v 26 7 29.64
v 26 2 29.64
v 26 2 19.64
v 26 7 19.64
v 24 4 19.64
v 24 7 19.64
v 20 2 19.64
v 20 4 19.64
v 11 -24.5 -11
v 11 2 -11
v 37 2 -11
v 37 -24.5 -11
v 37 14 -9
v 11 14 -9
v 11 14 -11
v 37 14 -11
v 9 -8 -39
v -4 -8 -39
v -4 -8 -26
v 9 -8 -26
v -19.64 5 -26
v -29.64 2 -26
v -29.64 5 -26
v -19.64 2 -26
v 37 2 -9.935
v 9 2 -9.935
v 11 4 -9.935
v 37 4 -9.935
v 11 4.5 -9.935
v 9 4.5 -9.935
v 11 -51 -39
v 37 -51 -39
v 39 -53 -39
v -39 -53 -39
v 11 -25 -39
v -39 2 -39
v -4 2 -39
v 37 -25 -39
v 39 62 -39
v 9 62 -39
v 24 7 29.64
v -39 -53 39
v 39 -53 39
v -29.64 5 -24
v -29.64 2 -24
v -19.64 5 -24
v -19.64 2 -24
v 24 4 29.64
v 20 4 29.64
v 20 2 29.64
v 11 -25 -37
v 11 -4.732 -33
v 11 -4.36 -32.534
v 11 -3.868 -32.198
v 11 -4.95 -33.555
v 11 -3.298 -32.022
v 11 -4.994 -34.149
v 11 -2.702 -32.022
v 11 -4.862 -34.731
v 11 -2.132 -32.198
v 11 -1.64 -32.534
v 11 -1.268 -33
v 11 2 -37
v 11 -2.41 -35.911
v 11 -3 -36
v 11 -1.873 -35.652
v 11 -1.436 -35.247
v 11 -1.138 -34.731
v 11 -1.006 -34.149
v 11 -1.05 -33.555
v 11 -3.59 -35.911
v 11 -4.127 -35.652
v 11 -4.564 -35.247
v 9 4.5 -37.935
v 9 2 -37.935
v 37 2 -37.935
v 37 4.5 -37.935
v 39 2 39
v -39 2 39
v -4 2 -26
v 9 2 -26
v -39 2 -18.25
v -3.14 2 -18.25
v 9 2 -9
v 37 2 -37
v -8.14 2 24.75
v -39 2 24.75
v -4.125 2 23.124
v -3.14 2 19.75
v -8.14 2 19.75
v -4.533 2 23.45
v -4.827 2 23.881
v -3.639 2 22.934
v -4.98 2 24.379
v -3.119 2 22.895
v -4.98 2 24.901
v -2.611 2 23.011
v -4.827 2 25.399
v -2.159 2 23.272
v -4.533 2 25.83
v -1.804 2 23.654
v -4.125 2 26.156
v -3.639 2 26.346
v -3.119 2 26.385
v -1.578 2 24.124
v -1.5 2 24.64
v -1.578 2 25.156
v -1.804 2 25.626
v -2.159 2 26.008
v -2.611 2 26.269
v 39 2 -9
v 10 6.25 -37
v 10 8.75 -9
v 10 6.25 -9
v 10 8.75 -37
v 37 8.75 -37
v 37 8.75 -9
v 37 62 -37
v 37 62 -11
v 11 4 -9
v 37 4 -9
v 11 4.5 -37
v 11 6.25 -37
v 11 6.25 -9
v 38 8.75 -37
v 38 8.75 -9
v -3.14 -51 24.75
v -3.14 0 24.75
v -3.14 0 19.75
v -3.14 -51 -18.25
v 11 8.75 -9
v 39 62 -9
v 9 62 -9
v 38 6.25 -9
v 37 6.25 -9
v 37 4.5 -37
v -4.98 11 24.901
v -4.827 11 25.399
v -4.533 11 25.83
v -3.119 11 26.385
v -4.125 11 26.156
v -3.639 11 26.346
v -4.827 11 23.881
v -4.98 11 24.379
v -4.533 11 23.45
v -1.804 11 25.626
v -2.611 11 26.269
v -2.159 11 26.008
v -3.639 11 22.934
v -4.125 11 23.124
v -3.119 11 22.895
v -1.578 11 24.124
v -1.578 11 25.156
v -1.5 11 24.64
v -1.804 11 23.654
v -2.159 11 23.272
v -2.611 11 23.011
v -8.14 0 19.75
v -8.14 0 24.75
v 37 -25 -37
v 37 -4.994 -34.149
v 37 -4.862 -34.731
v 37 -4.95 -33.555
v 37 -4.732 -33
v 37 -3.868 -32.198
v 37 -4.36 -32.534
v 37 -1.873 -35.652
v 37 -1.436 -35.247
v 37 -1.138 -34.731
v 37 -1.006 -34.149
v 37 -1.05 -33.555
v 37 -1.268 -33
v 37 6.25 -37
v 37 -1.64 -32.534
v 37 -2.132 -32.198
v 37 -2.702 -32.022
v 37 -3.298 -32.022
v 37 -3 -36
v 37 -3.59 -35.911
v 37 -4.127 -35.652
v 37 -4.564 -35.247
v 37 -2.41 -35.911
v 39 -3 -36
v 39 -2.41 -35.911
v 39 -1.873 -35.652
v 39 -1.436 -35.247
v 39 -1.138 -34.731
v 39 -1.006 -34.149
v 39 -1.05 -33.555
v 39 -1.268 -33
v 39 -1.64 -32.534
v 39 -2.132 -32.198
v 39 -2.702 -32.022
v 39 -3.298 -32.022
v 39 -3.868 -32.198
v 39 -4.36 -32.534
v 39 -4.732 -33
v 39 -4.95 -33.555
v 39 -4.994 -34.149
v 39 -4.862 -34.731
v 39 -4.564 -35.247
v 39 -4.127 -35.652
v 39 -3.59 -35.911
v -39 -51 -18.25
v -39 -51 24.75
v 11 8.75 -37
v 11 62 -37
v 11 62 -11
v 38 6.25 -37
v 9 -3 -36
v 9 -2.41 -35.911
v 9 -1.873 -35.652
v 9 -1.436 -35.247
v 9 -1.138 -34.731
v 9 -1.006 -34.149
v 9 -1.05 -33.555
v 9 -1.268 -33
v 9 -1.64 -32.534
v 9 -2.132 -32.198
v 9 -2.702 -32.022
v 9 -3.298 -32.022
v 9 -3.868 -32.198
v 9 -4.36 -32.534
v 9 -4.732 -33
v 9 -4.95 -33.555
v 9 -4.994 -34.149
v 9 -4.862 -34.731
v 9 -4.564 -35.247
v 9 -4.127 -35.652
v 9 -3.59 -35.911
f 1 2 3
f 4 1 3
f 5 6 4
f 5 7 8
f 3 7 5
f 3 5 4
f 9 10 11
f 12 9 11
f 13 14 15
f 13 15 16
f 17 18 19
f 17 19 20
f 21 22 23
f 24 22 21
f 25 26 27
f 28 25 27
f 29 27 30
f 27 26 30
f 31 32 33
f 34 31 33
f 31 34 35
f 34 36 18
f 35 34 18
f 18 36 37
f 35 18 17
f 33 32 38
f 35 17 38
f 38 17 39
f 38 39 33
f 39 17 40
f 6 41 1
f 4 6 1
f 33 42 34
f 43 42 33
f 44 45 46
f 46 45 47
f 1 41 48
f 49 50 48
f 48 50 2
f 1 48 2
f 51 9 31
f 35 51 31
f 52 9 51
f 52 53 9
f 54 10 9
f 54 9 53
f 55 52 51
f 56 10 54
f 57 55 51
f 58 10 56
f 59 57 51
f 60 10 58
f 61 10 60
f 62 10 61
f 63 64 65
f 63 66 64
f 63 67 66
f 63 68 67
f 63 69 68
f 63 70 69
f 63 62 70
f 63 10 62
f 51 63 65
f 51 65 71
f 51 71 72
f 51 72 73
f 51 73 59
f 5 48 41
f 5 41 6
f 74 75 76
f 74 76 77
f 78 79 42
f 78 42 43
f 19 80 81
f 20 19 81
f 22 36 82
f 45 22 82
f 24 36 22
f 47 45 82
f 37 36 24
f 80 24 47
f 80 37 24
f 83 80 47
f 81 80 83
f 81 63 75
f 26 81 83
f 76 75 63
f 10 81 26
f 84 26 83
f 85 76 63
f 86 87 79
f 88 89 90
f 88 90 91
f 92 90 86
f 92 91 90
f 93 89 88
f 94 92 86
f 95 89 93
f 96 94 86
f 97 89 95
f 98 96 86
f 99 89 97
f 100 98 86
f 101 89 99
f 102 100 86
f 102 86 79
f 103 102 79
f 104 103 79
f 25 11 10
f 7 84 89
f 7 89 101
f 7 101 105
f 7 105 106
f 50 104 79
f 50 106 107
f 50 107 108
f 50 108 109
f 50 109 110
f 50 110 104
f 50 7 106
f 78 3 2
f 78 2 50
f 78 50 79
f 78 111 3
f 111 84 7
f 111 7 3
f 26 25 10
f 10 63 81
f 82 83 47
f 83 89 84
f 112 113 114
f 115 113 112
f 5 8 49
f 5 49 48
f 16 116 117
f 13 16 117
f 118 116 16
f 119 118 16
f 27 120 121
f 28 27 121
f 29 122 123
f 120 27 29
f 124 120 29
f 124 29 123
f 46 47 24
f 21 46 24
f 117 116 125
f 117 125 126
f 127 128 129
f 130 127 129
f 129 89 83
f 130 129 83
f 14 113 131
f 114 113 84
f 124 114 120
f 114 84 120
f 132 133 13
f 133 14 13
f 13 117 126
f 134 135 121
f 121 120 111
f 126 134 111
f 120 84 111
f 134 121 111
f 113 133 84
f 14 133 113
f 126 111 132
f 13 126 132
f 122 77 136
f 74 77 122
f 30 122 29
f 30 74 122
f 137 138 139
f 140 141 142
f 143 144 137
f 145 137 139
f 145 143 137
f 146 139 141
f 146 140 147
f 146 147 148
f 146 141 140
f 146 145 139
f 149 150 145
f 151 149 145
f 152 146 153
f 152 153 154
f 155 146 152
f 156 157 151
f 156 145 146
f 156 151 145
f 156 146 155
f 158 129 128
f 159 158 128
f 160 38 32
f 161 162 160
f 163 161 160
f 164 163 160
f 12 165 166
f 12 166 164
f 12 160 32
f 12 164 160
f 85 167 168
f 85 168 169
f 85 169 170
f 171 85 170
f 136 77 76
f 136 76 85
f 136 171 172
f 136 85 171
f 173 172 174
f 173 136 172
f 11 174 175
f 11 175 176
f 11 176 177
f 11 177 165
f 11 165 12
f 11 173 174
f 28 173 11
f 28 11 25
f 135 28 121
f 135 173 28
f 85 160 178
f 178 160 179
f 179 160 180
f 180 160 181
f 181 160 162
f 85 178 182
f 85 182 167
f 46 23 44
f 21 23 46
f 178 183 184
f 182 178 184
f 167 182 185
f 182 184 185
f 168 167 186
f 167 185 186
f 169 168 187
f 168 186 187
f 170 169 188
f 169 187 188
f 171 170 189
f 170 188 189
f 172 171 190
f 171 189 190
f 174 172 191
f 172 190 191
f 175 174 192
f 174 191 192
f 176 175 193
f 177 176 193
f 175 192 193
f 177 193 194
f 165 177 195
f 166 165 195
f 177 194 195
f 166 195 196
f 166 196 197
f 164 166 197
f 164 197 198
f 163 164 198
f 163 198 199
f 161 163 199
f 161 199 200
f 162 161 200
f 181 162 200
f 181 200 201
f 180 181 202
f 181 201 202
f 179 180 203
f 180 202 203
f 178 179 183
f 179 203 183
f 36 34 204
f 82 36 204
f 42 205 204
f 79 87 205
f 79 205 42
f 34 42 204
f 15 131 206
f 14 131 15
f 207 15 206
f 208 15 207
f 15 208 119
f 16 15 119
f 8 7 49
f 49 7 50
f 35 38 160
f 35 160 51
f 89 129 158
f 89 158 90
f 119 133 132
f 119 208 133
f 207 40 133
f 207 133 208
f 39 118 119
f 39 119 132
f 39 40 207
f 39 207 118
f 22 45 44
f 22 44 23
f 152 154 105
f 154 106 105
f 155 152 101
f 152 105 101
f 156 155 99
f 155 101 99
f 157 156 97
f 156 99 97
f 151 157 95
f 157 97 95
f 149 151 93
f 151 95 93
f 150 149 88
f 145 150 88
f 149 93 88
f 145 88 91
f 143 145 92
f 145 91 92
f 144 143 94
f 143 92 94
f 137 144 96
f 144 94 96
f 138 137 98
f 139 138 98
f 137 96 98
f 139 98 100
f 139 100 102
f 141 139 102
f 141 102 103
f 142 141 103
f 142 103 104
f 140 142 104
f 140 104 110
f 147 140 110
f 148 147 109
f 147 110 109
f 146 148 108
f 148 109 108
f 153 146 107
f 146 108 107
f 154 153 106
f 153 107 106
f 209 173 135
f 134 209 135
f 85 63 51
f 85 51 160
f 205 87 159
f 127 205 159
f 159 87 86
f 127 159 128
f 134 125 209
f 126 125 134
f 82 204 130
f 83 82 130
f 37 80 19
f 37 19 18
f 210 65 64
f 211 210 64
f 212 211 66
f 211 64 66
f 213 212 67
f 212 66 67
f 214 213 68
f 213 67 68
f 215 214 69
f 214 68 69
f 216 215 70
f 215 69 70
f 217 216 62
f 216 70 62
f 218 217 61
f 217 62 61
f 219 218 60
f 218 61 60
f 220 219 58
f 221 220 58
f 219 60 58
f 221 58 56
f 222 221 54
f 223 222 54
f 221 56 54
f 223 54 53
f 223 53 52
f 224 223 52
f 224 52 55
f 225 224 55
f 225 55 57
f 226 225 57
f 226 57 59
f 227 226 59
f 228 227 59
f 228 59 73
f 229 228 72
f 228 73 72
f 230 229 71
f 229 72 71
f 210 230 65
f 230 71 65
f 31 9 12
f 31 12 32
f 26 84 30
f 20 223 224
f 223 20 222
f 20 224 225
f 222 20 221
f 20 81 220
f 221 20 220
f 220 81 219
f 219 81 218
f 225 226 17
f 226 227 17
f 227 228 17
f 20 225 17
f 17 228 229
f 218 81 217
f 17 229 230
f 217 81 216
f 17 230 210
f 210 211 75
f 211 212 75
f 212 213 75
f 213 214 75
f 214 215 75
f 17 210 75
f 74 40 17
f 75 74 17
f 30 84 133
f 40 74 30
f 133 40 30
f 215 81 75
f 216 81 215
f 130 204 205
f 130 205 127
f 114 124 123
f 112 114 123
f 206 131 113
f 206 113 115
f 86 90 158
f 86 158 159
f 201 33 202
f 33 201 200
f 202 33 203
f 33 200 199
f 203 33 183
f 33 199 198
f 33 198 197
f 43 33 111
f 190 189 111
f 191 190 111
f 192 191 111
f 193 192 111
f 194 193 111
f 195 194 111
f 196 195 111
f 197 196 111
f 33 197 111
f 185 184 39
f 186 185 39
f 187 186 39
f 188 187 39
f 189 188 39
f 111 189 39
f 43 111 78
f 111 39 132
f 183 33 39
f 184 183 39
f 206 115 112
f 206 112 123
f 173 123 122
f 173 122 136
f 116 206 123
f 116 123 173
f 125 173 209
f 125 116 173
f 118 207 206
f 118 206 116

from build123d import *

# Parameters (mm, degrees)
SKETCH1_W            = 78
SKETCH1_H            = 78
BOSS_EXTRUDE1_DEPTH  = 2
SKETCH2_W            = 30
SKETCH2_H            = 30
BOSS_EXTRUDE2_DEPTH  = 60
SKETCH3_W            = 26
SKETCH3_H            = 26
CUT_EXTRUDE1_DEPTH   = 62
SKETCH4_W            = 28
SKETCH4_H            = 2.5
CUT_EXTRUDE2_DEPTH   = 28
SKETCH5_W            = 26
SKETCH5_H            = 10
CUT_EXTRUDE3_DEPTH   = 2
SKETCH6_W            = 28
SKETCH6_H            = 2.5
CUT_EXTRUDE4_DEPTH   = 1
SKETCH7_W            = 28
SKETCH7_H            = 2.5
CUT_EXTRUDE5_DEPTH   = 1
SKETCH14_R           = 1.75
BOSS_EXTRUDE8_DEPTH  = 5
SKETCH16_W           = 4
SKETCH16_H           = 5
BOSS_EXTRUDE10_DEPTH = 2
SKETCH17_W           = 2
SKETCH17_H           = 10
BOSS_EXTRUDE11_DEPTH = 5
SKETCH18_W           = 10
SKETCH18_H           = 2
BOSS_EXTRUDE12_DEPTH = 3
SKETCH21_W           = 78
SKETCH21_H           = 78
BOSS_EXTRUDE13_DEPTH = 53
SKETCH15_W           = 43
SKETCH15_H           = 43
CUT_EXTRUDE6_DEPTH   = 53
SKETCH23_W           = 5
SKETCH23_H           = 2
BOSS_EXTRUDE15_DEPTH = 5
SKETCH24_W           = 26
SKETCH24_H           = 26
CUT_EXTRUDE9_DEPTH   = 51
SKETCH27_W           = 26
SKETCH27_H           = 26
CUT_EXTRUDE10_DEPTH  = 2
BOSS_EXTRUDE16_DEPTH = 26
SKETCH31_W           = 13
SKETCH31_H           = 13
CUT_EXTRUDE12_DEPTH  = 10
SKETCH32_R           = 2
CUT_EXTRUDE13_DEPTH  = 2
SKETCH33_R           = 2
CUT_EXTRUDE14_DEPTH  = 2
SKETCH36_R           = 1.75
BOSS_EXTRUDE17_DEPTH = 4


with BuildPart() as part:
    # Sketch1 → Boss-Extrude1 (new body)
    with BuildSketch(Plane(origin=(0, 0, 0), x_dir=(1, 0, 0), z_dir=(0, 1, 0))):
        Rectangle(SKETCH1_W, SKETCH1_H)
    extrude(amount=BOSS_EXTRUDE1_DEPTH)

    # Sketch2 → Boss-Extrude2 (add)
    with BuildSketch(Plane(origin=(0, 2, 0), x_dir=(1, 0, 0), z_dir=(0, 1, 0))):
        with Locations((24, 24)):
            Rectangle(SKETCH2_W, SKETCH2_H)
    extrude(amount=BOSS_EXTRUDE2_DEPTH)

    # Sketch3 → Cut-Extrude1 (cut)
    with BuildSketch(Plane(origin=(0, 62, 0), x_dir=(1, 0, 0), z_dir=(0, 1, 0))):
        with Locations((24, 24)):
            Rectangle(SKETCH3_W, SKETCH3_H)
    extrude(amount=-CUT_EXTRUDE1_DEPTH, mode=Mode.SUBTRACT)

    # Sketch4 → Cut-Extrude2 (cut)
    with BuildSketch(Plane.ZY.offset(-9)):
        with Locations((-23.934548619, 3.25)):
            Rectangle(SKETCH4_W, SKETCH4_H)
    extrude(amount=-CUT_EXTRUDE2_DEPTH, mode=Mode.SUBTRACT)

    # Sketch5 → Cut-Extrude3 (cut)
    with BuildSketch(Plane.XY.offset(-9)):
        with Locations((24, 9)):
            Rectangle(SKETCH5_W, SKETCH5_H)
    extrude(amount=-CUT_EXTRUDE3_DEPTH, mode=Mode.SUBTRACT)

    # Sketch6 → Cut-Extrude4 (cut)
    with BuildSketch(Plane.ZY.offset(-37)):
        with Locations((-23, 7.5)):
            Rectangle(SKETCH6_W, SKETCH6_H)
    extrude(amount=-CUT_EXTRUDE4_DEPTH, mode=Mode.SUBTRACT)

    # Sketch7 → Cut-Extrude5 (cut)
    with BuildSketch(Plane(origin=(11, 0, 0), x_dir=(0, 0, -1), z_dir=(1, 0, 0))):
        with Locations((23, 7.5)):
            Rectangle(SKETCH7_W, SKETCH7_H)
    extrude(amount=-CUT_EXTRUDE5_DEPTH, mode=Mode.SUBTRACT)

    # Sketch14 → Boss-Extrude8 (add)
    with BuildSketch(Plane(origin=(0, 2, 0), x_dir=(1, 0, 0), z_dir=(0, 1, 0))):
        with Locations((-3.25, -24.64)):
            Circle(SKETCH14_R)
    extrude(amount=BOSS_EXTRUDE8_DEPTH)

    # Sketch16 → Boss-Extrude10 (add)
    with BuildSketch(Plane(origin=(0, 2, 0), x_dir=(1, 0, 0), z_dir=(0, 1, 0))):
        with Locations((22, -22.14)):
            Rectangle(SKETCH16_W, SKETCH16_H)
        with Locations((22, -27.14)):
            Rectangle(SKETCH16_W, SKETCH16_H)
    extrude(amount=BOSS_EXTRUDE10_DEPTH)

    # Sketch17 → Boss-Extrude11 (add)
    with BuildSketch(Plane(origin=(0, 2, 0), x_dir=(1, 0, 0), z_dir=(0, 1, 0))):
        with Locations((25, -24.64)):
            Rectangle(SKETCH17_W, SKETCH17_H)
    extrude(amount=BOSS_EXTRUDE11_DEPTH)

    # Sketch18 → Boss-Extrude12 (add)
    with BuildSketch(Plane(origin=(0, 2, 0), x_dir=(1, 0, 0), z_dir=(0, 1, 0))):
        with Locations((-24.64, 25)):
            Rectangle(SKETCH18_W, SKETCH18_H)
    extrude(amount=BOSS_EXTRUDE12_DEPTH)

    # Sketch21 → Boss-Extrude13 (add)
    with BuildSketch(Plane.XZ):
        Rectangle(SKETCH21_W, SKETCH21_H)
    extrude(amount=BOSS_EXTRUDE13_DEPTH)

    # Sketch15 → Cut-Extrude6 (cut)
    with BuildSketch(Plane(origin=(0, 2, 0), x_dir=(1, 0, 0), z_dir=(0, 1, 0))):
        with Locations((-24.64, -3.25)):
            Rectangle(SKETCH15_W, SKETCH15_H)
    extrude(amount=-CUT_EXTRUDE6_DEPTH, mode=Mode.SUBTRACT)

    # Sketch23 → Boss-Extrude15 (add)
    with BuildSketch(Plane.ZY.offset(3.14)):
        with Locations((22.25, 1)):
            Rectangle(SKETCH23_W, SKETCH23_H)
    extrude(amount=BOSS_EXTRUDE15_DEPTH)

    # Sketch24 → Cut-Extrude9 (cut)
    with BuildSketch(Plane(origin=(0, 0, 0), x_dir=(1, 0, 0), z_dir=(0, 1, 0))):
        with Locations((24, 24)):
            Rectangle(SKETCH24_W, SKETCH24_H)
    extrude(amount=-CUT_EXTRUDE9_DEPTH, mode=Mode.SUBTRACT)

    # Sketch27 → Cut-Extrude10 (cut)
    with BuildSketch(Plane(origin=(0, 0, -39), x_dir=(-1, 0, 0), z_dir=(0, 0, -1))):
        with Locations((-24, -38)):
            Rectangle(SKETCH27_W, SKETCH27_H)
    extrude(amount=-CUT_EXTRUDE10_DEPTH, mode=Mode.SUBTRACT)

    # Sketch28 → Boss-Extrude16 (add)
    with BuildSketch(Plane(origin=(11, 0, 0), x_dir=(0, 0, -1), z_dir=(1, 0, 0))):
        Polygon((39, -51), (11, -51), (11, -24.5), align=None)
    extrude(amount=BOSS_EXTRUDE16_DEPTH)

    # Sketch31 → Cut-Extrude12 (cut)
    with BuildSketch(Plane(origin=(0, 2, 0), x_dir=(1, 0, 0), z_dir=(0, 1, 0))):
        with Locations((2.5, 32.5)):
            Rectangle(SKETCH31_W, SKETCH31_H)
    extrude(amount=-CUT_EXTRUDE12_DEPTH, mode=Mode.SUBTRACT)

    # Sketch32 → Cut-Extrude13 (cut)
    with BuildSketch(Plane(origin=(39, 0, 0), x_dir=(0, 0, -1), z_dir=(1, 0, 0))):
        with Locations((34, -3)):
            Circle(SKETCH32_R)
    extrude(amount=-CUT_EXTRUDE13_DEPTH, mode=Mode.SUBTRACT)

    # Sketch33 → Cut-Extrude14 (cut)
    with BuildSketch(Plane(origin=(11, 0, 0), x_dir=(0, 0, -1), z_dir=(1, 0, 0))):
        with Locations((34, -3)):
            Circle(SKETCH33_R)
    extrude(amount=-CUT_EXTRUDE14_DEPTH, mode=Mode.SUBTRACT)

    # Sketch36 → Boss-Extrude17 (add)
    with BuildSketch(Plane(origin=(0, 7, 0), x_dir=(1, 0, 0), z_dir=(0, 1, 0))):
        with Locations((-3.25, -24.64)):
            Circle(SKETCH36_R)
    extrude(amount=BOSS_EXTRUDE17_DEPTH)


solid = part.part
